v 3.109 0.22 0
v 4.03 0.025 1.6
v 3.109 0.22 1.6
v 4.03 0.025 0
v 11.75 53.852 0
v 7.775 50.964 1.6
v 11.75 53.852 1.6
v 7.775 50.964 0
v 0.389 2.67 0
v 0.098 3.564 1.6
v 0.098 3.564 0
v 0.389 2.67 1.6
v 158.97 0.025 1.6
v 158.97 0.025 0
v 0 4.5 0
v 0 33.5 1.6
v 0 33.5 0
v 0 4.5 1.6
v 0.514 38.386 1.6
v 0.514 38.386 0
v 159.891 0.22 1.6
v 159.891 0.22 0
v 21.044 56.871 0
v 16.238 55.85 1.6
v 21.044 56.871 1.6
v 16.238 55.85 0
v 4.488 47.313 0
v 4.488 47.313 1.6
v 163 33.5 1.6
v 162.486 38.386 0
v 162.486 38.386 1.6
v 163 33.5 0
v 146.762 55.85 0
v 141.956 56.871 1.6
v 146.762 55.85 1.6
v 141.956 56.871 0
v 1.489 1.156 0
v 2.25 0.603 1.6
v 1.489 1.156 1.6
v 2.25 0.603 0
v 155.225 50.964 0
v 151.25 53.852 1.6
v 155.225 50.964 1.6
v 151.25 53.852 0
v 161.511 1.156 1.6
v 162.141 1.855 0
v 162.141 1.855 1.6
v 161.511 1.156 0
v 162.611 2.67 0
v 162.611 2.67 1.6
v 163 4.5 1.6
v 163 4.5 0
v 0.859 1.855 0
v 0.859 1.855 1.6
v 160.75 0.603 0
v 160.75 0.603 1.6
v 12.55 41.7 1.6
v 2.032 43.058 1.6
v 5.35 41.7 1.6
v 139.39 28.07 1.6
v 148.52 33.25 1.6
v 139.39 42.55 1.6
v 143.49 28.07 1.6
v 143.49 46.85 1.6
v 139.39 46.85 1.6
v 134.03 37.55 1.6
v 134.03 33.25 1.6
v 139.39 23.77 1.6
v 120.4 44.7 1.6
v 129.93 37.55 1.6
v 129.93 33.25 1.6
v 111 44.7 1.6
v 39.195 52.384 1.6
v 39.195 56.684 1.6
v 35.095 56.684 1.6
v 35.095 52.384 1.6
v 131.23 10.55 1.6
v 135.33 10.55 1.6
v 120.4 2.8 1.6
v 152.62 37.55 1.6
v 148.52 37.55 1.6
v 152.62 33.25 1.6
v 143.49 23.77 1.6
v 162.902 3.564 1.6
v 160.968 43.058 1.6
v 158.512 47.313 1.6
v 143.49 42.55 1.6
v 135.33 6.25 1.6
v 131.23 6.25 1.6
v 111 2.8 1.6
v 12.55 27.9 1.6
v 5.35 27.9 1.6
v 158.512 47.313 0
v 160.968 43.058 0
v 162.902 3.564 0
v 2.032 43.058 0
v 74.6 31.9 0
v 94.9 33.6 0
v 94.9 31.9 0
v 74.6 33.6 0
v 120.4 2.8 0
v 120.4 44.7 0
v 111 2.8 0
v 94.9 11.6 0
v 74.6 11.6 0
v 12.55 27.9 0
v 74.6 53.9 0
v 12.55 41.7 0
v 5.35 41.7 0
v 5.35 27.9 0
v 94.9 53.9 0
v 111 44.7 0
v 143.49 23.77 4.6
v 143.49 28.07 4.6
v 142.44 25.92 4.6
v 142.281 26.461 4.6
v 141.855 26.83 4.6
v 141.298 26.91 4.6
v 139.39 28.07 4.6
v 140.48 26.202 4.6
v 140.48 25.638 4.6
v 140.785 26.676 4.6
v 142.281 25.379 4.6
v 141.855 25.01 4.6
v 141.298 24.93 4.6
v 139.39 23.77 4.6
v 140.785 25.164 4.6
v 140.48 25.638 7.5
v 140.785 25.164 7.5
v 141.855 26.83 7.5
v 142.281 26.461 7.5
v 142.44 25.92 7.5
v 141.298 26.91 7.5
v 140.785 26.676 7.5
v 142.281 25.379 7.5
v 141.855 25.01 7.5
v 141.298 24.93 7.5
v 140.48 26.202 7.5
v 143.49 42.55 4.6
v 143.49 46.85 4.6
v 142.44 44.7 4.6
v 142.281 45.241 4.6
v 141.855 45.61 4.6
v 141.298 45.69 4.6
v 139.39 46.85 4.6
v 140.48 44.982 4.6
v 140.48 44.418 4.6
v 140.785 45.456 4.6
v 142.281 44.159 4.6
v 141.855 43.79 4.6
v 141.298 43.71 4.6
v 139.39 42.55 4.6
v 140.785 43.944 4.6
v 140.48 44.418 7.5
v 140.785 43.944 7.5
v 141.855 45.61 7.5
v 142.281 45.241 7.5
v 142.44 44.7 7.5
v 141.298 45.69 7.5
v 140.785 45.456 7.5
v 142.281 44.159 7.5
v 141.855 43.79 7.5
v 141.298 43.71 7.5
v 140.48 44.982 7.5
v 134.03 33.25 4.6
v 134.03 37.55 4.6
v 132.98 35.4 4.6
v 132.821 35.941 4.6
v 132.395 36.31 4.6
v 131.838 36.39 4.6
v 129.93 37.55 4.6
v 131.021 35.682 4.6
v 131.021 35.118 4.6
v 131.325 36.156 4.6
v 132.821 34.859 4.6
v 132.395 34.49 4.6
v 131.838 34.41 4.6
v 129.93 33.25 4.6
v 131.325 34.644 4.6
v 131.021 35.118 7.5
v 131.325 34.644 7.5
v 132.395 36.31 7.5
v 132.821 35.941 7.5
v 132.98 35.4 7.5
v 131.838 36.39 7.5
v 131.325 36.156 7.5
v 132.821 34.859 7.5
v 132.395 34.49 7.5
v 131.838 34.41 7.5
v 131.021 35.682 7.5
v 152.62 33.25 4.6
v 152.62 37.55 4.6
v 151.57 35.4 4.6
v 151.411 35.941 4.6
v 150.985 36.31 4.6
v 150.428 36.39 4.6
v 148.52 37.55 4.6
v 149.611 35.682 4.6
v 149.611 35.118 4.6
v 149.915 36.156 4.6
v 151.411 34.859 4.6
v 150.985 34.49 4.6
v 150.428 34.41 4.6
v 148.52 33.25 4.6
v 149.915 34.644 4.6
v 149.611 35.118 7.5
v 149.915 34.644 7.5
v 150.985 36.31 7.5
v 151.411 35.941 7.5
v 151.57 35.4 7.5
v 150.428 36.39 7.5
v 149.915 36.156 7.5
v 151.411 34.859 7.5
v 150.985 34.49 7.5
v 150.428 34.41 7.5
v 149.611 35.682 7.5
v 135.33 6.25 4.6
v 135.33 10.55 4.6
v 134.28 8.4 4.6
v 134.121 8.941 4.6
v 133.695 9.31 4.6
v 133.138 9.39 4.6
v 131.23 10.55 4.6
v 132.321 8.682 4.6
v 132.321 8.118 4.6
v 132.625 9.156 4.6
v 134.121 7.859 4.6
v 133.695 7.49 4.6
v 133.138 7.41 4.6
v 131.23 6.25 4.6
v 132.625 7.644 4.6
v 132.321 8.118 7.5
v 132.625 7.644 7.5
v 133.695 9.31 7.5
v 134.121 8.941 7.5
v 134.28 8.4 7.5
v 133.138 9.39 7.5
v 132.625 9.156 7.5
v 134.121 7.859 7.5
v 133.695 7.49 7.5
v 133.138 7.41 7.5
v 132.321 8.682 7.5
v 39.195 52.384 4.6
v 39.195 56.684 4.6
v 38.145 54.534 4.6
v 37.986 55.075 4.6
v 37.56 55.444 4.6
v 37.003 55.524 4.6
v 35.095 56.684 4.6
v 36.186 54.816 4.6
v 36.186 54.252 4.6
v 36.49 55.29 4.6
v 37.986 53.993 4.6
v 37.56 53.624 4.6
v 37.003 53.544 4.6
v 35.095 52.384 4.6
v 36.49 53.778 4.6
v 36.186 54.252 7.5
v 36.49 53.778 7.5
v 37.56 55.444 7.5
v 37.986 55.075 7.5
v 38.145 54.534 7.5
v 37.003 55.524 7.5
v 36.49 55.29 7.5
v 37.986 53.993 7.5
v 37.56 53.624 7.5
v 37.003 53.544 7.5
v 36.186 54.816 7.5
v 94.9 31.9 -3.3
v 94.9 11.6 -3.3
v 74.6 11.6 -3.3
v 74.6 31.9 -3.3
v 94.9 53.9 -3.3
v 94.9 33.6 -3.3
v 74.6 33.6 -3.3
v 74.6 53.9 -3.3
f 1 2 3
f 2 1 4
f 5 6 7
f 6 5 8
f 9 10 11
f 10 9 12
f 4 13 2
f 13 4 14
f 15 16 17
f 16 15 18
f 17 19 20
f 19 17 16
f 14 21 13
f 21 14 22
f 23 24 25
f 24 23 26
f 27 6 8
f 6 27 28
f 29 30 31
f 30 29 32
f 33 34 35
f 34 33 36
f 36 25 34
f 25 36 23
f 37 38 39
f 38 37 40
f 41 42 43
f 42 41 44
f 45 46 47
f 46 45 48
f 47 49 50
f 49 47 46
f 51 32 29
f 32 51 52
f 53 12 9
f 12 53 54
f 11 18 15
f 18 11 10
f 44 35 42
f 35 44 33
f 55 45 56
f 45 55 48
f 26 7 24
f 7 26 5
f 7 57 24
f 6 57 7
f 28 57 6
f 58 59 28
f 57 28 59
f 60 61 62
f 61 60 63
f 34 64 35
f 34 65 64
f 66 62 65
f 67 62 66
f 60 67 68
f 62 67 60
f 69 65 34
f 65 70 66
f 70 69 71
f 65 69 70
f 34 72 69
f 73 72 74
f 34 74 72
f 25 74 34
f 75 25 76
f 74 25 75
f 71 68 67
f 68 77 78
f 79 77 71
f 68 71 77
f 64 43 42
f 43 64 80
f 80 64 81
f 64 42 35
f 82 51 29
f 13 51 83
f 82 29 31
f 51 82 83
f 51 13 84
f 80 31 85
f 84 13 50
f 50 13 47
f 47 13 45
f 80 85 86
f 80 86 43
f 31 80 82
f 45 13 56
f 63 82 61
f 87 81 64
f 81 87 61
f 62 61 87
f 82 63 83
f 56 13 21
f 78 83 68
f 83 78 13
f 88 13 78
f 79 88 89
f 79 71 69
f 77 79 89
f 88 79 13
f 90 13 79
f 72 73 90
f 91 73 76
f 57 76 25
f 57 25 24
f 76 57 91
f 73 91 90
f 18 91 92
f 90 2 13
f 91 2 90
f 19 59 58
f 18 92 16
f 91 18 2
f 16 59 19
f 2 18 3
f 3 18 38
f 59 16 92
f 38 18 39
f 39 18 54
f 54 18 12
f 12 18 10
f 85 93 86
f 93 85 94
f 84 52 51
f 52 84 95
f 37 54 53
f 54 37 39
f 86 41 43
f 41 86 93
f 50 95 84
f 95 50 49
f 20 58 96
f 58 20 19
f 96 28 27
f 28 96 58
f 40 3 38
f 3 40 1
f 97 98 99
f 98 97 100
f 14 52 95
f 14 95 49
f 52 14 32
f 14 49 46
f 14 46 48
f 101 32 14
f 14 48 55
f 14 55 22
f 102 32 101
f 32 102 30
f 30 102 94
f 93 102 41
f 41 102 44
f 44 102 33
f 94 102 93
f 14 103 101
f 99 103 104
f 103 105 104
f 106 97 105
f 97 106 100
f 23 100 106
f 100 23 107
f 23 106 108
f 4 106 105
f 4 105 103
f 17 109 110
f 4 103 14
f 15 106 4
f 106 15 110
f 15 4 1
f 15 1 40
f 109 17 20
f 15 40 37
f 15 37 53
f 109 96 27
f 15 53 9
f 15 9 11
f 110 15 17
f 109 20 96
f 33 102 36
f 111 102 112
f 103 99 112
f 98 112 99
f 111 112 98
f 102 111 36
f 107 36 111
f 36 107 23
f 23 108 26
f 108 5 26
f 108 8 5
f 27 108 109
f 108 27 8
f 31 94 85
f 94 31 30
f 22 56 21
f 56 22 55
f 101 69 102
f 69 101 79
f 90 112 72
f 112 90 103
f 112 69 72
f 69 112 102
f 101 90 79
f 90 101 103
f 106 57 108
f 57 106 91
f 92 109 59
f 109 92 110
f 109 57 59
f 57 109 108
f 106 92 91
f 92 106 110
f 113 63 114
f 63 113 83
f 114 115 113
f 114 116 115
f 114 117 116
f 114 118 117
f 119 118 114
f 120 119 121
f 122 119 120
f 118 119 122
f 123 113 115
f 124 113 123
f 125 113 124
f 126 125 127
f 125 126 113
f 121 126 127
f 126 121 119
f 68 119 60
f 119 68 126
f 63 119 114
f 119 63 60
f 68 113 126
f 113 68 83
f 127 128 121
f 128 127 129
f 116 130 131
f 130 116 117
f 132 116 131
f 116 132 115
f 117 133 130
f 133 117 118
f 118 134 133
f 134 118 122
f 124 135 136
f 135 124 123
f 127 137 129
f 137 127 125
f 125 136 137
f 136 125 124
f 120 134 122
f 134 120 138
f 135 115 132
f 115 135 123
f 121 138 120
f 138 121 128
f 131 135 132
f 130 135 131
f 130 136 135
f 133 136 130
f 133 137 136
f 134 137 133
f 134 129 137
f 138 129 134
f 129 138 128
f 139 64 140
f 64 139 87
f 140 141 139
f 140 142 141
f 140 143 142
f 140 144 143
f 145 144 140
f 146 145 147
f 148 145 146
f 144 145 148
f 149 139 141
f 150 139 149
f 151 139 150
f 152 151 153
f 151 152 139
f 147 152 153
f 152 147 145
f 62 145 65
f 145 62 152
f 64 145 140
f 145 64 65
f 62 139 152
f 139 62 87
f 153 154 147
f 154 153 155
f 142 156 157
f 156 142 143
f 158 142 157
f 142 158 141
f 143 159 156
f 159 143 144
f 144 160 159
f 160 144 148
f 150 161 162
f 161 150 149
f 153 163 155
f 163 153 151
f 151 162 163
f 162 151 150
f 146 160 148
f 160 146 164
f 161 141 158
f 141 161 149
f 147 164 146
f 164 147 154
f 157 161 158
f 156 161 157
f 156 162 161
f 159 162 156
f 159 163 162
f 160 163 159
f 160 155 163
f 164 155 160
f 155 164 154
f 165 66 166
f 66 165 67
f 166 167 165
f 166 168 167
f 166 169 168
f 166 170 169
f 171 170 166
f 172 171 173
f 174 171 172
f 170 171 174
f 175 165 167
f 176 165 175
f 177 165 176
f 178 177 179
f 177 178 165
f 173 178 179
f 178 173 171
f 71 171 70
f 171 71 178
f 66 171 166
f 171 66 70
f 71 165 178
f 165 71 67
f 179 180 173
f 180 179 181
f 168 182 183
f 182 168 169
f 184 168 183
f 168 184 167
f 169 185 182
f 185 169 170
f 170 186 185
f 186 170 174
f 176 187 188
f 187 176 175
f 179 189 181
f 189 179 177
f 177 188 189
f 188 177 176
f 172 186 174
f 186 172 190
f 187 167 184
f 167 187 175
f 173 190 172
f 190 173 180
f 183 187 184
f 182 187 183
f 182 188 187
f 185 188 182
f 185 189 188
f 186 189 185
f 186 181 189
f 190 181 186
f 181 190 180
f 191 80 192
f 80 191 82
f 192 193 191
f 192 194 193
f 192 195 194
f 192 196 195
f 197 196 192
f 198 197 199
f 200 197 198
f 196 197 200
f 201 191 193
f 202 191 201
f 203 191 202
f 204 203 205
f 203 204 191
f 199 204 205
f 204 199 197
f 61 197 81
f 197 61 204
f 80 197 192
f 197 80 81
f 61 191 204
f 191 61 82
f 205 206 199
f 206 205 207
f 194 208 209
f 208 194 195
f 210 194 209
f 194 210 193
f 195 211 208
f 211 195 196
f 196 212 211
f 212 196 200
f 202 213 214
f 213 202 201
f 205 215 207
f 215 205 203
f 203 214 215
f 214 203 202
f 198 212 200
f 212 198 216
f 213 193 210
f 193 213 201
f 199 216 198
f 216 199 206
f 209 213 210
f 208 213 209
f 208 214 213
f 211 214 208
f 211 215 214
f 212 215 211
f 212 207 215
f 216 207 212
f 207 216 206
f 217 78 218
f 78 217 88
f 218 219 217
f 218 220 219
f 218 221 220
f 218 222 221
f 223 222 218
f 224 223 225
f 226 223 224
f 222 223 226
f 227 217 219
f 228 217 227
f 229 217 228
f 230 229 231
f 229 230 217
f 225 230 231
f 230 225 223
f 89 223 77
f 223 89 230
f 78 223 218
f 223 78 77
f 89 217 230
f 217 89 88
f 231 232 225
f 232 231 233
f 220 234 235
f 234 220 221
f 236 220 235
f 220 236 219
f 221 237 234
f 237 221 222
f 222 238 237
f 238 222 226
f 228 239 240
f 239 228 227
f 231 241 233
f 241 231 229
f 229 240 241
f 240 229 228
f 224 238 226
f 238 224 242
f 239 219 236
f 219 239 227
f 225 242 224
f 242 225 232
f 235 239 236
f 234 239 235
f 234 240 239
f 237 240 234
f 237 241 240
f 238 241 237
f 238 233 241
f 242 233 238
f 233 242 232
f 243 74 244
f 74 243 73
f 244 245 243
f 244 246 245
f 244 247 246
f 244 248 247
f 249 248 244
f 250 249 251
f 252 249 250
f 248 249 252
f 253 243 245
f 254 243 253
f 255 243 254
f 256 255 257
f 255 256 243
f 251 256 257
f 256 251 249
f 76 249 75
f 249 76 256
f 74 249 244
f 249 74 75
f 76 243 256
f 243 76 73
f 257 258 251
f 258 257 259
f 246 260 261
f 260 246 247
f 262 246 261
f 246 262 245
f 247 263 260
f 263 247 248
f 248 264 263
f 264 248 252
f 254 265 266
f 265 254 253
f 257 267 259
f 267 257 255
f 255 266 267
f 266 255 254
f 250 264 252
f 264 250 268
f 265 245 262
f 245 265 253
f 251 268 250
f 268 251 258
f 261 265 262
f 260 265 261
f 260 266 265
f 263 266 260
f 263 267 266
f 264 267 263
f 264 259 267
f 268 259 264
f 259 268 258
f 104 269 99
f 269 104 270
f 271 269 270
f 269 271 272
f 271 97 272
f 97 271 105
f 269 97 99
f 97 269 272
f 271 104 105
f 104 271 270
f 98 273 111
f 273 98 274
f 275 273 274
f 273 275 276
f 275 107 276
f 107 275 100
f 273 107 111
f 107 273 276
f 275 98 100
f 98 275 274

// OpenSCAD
$fs = 0.6;

W = 163;
H = 57;
T = 1.6;
RB = 4.5; // Radius of the bottom corners.
RT = 23.5; // Radius of the top corners.
WESP = 20.30; // Width of ESP chip.
TESP = 3.3; // Thickness of ESP chip.

WBTN = 4.1;
HBTN = 4.3;
TBTN = 3;

module pcb() {
  color("green")
    difference() {
      hull() {
        // top-left corner
        translate([RT, H - RT, 0])
          cylinder(h=T, r=RT);
        // top-right corner
        translate([W - RT, H - RT, 0])
          cylinder(h=T, r=RT);
        // bottom-left corner
        translate([RB, RB, 0])
          cylinder(h=T, r=RB);
        // bottom-right corner
        translate([W - RB, RB, 0])
          cylinder(h=T, r=RB);
      }
      translate([111.0, 2.8, -.1])
        cube([9.4, 41.9, 3]);
      translate([5.35, 27.9, -.1])
        cube([7.2, 13.8, 3]);
    }
  // ESP 1
  translate([74.6, 11.6, -TESP])
    cube([WESP, WESP, TESP + .1]);
  // ESP 2
  translate([74.6, 33.6, -TESP])
    cube([WESP, WESP, TESP + .1]);
  // button S
  translate([139.39, 23.77, T - .1])
    pcb_button();
  // button N
  translate([139.39, 42.55, T - .1])
    pcb_button();
  // button W
  translate([129.93, 33.25, T - .1])
    pcb_button();
  // button E
  translate([148.52, 33.25, T - .1])
    pcb_button();
  // button menu
  translate([131.23, 6.25, T - .1])
    pcb_button();
  // button reset
  translate([35.095, 52.384, T - .1])
    pcb_button();
}

module pcb_button() {
  color("gray")
    cube([WBTN, HBTN, TBTN + .1]);
  color("blue")
    translate([WBTN / 2, HBTN / 2, 0])
      cylinder(h=6, r=1);
  ;
}

pcb();
